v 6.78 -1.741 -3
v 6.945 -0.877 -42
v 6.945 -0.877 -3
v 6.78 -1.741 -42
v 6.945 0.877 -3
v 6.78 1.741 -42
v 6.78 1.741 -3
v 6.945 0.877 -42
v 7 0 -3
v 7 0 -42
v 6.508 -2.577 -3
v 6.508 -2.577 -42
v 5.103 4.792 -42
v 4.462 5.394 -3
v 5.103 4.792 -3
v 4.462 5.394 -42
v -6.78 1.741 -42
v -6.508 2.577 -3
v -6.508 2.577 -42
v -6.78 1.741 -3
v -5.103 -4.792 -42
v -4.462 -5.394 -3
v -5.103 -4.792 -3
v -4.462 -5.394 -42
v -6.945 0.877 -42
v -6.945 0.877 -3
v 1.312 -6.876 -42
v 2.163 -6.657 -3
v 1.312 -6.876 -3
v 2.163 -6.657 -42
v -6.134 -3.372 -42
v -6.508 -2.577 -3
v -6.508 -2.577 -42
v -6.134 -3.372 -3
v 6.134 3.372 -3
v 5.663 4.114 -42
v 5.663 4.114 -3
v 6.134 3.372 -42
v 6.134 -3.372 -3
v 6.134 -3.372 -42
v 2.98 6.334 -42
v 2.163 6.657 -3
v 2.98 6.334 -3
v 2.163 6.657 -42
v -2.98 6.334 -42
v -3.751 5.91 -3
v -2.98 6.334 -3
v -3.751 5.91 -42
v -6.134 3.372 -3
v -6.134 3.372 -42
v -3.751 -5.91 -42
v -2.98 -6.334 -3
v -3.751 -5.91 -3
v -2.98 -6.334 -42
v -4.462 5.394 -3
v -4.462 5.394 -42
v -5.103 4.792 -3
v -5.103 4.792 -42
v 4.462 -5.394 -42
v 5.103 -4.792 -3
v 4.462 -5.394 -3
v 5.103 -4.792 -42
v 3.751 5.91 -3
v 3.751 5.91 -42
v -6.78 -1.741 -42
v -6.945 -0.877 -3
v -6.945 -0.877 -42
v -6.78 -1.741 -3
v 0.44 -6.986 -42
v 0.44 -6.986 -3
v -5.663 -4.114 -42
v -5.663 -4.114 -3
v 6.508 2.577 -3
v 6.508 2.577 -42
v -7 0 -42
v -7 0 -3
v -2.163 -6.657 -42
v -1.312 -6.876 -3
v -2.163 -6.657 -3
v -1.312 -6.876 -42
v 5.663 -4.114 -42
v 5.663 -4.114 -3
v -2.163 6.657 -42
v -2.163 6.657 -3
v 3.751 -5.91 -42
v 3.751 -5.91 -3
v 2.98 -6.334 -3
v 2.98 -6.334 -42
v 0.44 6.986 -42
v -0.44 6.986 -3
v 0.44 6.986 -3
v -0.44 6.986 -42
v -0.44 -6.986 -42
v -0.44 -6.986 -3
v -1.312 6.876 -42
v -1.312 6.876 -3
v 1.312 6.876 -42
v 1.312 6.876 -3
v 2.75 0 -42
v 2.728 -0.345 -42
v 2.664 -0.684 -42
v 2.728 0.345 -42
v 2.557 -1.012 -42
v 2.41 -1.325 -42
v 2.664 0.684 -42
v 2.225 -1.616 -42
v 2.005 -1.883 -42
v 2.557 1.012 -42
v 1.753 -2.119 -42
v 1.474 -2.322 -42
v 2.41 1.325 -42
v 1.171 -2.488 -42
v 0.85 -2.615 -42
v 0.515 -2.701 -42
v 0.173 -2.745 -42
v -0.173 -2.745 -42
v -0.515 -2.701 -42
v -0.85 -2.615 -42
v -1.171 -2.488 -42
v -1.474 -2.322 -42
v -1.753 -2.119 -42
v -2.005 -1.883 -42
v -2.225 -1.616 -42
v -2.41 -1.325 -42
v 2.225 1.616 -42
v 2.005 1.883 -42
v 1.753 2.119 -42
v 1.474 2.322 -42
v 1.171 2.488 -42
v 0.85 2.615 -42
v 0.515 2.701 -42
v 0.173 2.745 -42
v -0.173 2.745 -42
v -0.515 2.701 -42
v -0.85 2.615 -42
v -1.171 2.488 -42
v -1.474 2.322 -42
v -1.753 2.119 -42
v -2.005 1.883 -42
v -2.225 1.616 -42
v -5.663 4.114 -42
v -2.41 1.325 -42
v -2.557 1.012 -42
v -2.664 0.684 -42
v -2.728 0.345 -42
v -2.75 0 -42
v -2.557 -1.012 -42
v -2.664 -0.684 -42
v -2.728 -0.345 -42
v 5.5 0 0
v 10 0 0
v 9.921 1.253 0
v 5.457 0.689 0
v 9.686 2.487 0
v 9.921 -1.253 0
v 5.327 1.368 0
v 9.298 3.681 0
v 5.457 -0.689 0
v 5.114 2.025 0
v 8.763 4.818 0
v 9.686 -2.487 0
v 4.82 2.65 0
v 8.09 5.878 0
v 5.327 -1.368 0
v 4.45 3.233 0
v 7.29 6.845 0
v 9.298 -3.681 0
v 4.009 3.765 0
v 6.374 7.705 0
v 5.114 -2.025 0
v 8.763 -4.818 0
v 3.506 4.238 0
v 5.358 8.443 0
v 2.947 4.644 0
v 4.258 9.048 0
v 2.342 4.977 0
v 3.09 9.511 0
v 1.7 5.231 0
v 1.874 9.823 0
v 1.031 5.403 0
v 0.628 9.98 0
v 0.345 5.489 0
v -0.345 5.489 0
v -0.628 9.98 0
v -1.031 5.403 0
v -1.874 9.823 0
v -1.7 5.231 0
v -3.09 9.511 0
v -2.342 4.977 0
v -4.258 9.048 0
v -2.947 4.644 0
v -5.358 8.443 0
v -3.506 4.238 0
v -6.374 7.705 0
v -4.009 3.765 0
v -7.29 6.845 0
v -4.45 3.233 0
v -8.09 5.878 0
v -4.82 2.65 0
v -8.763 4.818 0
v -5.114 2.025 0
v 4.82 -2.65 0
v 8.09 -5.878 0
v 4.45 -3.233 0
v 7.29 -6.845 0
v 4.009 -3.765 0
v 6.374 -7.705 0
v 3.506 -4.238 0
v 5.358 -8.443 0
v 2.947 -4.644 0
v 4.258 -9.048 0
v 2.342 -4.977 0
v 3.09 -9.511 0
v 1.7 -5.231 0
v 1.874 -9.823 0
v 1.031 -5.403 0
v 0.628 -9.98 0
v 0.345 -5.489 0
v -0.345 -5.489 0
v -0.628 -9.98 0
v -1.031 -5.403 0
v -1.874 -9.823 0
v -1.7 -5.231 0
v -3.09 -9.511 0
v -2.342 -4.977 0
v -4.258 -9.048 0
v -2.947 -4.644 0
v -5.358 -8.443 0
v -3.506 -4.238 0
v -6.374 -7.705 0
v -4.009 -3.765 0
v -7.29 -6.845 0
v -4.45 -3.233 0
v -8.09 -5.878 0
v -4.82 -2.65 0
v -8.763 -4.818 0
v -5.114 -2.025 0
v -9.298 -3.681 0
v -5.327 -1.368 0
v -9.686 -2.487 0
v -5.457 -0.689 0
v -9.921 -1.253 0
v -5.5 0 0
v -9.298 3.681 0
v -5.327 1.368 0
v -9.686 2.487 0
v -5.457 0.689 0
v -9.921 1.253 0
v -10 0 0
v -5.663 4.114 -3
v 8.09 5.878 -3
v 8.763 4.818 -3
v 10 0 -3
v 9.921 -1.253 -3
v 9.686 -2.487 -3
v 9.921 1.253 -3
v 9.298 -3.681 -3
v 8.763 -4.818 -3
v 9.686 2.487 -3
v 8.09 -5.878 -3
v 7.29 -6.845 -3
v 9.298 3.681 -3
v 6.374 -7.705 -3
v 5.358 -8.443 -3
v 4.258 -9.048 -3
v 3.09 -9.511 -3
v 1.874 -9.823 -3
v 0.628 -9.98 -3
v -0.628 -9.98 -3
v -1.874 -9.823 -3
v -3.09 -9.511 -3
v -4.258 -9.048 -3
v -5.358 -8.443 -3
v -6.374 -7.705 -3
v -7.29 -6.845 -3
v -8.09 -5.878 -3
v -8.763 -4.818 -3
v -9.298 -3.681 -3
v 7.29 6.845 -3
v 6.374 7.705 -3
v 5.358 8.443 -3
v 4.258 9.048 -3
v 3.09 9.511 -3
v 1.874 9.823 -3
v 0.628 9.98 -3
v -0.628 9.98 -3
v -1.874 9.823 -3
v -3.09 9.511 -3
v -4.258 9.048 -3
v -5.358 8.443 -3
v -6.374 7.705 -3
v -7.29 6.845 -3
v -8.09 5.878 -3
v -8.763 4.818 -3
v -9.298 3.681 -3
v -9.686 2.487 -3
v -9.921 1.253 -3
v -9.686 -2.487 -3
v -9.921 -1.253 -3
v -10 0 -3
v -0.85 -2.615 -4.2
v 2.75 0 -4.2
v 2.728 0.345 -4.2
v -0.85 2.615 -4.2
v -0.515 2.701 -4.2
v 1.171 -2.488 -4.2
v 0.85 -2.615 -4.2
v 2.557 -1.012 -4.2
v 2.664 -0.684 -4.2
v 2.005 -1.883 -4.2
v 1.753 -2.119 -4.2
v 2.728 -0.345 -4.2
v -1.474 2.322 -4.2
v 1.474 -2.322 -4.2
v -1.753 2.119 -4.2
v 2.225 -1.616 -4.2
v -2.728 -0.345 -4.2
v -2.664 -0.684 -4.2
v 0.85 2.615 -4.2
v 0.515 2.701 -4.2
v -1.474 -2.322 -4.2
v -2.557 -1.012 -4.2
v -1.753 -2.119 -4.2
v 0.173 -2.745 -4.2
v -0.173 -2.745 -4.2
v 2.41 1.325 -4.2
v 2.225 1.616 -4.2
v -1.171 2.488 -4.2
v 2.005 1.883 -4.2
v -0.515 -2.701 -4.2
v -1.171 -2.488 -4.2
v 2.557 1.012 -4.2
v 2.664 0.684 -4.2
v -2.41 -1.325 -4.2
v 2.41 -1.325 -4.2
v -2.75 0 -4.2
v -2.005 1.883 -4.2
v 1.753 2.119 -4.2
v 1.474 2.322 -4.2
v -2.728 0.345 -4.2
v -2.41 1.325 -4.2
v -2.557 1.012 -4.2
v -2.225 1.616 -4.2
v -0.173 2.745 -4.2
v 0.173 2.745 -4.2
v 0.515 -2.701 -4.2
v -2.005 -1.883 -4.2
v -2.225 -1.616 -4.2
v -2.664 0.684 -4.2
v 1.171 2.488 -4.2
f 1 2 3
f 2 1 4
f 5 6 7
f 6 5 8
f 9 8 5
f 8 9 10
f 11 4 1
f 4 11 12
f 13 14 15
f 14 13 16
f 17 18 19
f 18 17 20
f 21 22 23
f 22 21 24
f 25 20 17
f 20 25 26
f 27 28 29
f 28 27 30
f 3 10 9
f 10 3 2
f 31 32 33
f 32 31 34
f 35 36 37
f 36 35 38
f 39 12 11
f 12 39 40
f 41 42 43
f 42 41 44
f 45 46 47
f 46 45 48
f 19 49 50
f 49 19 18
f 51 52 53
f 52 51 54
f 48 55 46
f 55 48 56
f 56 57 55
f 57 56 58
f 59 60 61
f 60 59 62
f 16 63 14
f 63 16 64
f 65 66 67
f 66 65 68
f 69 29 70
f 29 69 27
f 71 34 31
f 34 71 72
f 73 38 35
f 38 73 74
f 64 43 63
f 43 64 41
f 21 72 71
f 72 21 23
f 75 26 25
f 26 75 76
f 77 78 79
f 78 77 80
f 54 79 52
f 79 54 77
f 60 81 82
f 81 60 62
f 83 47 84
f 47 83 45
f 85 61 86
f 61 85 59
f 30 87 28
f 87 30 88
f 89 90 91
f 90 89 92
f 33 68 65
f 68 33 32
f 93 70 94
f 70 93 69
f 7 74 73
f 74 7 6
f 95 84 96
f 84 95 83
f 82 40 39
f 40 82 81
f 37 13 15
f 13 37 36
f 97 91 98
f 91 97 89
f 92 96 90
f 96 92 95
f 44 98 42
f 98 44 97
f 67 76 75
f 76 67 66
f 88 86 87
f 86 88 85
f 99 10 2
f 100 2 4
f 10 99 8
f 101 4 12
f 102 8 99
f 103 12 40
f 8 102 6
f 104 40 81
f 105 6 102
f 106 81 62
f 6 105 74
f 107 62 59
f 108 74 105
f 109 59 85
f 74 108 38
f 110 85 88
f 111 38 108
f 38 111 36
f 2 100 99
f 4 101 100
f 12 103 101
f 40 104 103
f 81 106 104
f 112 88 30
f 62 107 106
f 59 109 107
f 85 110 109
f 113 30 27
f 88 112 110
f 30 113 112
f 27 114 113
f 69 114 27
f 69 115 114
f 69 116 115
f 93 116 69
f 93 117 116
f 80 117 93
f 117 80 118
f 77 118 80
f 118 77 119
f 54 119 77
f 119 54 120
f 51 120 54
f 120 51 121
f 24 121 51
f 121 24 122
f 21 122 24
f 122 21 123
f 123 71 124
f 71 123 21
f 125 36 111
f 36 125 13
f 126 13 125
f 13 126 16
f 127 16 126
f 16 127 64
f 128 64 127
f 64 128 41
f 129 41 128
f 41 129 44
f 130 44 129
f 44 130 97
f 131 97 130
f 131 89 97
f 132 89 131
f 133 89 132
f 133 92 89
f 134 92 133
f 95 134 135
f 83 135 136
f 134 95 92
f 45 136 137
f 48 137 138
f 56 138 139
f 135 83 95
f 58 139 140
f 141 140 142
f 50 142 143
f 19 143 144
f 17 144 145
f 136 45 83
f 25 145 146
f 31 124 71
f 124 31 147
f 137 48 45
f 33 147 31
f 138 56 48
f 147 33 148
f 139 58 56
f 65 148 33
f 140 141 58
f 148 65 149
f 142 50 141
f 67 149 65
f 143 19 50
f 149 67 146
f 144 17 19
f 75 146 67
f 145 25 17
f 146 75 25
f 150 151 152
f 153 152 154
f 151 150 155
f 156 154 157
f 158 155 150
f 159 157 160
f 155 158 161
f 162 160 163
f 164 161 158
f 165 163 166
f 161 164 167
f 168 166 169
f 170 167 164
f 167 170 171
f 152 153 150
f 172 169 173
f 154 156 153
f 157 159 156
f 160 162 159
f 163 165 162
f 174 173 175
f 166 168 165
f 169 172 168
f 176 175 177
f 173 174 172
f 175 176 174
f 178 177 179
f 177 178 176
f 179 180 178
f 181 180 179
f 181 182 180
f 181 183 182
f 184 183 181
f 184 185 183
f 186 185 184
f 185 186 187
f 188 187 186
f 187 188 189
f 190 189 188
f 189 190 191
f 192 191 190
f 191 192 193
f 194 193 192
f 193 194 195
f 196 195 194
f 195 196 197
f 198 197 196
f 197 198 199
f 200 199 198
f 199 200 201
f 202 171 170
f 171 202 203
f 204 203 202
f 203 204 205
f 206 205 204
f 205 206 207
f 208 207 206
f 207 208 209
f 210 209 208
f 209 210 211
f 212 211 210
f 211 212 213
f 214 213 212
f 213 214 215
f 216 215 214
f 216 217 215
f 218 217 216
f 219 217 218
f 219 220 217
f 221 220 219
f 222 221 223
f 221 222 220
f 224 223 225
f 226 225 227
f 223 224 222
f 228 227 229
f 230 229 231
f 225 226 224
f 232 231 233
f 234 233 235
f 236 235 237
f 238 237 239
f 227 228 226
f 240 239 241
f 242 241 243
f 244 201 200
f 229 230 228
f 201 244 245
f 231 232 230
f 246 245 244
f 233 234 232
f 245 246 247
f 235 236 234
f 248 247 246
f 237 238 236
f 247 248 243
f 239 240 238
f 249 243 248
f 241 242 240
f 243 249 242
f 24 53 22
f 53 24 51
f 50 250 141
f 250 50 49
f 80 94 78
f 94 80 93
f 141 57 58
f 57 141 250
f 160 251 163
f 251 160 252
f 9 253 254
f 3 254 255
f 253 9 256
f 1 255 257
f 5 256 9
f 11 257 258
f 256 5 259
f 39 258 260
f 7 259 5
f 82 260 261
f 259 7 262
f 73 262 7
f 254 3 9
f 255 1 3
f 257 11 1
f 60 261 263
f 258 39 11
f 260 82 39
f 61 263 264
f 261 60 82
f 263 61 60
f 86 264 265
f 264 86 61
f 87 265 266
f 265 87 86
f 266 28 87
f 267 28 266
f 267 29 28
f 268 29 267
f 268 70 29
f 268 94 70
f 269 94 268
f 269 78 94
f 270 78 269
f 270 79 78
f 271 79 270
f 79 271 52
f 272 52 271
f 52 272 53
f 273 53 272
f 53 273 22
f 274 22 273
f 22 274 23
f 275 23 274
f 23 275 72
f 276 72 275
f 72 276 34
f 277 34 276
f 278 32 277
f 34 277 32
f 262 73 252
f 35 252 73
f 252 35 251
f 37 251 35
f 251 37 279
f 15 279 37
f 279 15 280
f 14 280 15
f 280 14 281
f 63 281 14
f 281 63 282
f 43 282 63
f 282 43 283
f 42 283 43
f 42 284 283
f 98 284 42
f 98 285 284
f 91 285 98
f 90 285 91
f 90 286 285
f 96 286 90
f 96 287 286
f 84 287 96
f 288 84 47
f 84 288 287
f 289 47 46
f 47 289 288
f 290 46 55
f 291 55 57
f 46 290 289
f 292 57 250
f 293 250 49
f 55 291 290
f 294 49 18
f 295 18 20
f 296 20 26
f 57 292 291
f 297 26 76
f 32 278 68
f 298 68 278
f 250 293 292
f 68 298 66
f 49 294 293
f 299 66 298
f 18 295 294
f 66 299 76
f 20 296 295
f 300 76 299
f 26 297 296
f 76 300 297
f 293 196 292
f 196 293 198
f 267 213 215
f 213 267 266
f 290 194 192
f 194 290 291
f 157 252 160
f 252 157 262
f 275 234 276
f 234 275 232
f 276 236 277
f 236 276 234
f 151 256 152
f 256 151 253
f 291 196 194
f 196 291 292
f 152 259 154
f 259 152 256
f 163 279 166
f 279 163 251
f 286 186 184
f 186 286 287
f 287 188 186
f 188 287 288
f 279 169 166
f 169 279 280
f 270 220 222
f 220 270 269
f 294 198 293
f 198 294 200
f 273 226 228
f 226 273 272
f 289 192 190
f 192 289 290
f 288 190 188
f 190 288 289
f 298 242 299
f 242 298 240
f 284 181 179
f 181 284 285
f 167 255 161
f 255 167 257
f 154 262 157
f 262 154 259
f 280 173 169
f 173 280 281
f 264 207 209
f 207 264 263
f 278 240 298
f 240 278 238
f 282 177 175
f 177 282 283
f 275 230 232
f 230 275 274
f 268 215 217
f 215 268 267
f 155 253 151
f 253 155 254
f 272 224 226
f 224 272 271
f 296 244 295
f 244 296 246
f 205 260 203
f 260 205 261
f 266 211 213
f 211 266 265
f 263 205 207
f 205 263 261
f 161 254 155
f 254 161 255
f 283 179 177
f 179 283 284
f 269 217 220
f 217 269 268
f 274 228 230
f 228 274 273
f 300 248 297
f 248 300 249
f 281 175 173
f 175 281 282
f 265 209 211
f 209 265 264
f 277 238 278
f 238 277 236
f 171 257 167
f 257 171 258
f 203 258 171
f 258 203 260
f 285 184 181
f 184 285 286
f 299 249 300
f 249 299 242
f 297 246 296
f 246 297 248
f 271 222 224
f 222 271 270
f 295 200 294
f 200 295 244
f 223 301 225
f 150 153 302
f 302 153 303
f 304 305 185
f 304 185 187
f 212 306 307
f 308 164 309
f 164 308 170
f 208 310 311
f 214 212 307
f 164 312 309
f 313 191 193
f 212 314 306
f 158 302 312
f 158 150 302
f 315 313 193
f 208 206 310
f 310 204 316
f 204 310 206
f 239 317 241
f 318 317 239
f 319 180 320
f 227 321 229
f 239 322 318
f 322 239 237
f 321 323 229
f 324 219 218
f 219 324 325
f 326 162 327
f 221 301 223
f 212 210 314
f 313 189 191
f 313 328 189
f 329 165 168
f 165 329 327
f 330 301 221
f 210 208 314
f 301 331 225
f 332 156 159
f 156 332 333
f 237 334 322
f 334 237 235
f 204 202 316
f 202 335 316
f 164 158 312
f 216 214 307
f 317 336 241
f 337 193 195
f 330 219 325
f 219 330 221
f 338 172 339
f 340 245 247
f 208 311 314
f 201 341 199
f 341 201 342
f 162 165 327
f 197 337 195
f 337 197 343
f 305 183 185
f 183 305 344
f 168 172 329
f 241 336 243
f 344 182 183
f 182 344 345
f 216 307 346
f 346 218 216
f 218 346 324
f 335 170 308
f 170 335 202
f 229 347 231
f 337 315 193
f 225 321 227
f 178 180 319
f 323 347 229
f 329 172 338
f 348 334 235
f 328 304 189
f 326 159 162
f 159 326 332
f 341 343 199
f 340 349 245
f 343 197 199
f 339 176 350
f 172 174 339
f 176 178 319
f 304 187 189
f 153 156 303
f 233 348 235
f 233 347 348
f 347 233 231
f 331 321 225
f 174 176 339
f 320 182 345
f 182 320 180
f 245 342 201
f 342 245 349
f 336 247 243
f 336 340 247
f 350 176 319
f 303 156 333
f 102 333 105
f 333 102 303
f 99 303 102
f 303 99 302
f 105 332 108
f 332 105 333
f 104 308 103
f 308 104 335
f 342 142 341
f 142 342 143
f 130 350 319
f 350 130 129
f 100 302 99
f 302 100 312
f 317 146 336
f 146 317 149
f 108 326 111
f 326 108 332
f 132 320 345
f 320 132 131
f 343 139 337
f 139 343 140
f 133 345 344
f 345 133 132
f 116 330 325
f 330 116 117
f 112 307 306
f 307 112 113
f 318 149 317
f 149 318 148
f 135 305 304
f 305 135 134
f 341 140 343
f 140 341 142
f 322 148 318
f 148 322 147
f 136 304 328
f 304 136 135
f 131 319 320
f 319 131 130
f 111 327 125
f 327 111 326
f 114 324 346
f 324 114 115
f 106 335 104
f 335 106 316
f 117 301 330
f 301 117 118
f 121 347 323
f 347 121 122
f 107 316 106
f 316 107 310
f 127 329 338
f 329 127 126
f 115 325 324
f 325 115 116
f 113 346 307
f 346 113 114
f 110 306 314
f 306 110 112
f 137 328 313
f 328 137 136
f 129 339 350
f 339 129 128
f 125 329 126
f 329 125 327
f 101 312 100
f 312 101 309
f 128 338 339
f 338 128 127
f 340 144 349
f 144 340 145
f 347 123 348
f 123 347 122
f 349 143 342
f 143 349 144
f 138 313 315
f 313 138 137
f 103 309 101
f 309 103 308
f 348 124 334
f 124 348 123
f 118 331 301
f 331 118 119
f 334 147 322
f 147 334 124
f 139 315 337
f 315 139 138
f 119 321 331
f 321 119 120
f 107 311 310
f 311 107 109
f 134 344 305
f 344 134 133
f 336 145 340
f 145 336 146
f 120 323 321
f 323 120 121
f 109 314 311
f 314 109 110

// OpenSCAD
$fn = 50;


difference() {
	union() {
		translate(v = [0, 0, -42.0000000000]) {
			cylinder(h = 42, r = 7.0000000000);
		}
		translate(v = [0, 0, -3.0000000000]) {
			cylinder(h = 3, r = 10.0000000000);
		}
	}
	union() {
		translate(v = [0, 0, 0]) {
			rotate(a = [0, 0, 0]) {
				difference() {
					union() {
						#translate(v = [0, 0, -42.0000000000]) {
							cylinder(h = 42, r = 2.2500000000);
						}
						#translate(v = [0, 0, -4.2000000000]) {
							cylinder(h = 4.2000000000, r = 7.0000000000, r1 = 2.7500000000, r2 = 5.5000000000);
						}
						#translate(v = [0, 0, -42.0000000000]) {
							cylinder(h = 42, r = 2.7500000000);
						}
						#translate(v = [0, 0, -42.0000000000]) {
							cylinder(h = 42, r = 2.2500000000);
						}
					}
					union();
				}
			}
		}
	}
}
